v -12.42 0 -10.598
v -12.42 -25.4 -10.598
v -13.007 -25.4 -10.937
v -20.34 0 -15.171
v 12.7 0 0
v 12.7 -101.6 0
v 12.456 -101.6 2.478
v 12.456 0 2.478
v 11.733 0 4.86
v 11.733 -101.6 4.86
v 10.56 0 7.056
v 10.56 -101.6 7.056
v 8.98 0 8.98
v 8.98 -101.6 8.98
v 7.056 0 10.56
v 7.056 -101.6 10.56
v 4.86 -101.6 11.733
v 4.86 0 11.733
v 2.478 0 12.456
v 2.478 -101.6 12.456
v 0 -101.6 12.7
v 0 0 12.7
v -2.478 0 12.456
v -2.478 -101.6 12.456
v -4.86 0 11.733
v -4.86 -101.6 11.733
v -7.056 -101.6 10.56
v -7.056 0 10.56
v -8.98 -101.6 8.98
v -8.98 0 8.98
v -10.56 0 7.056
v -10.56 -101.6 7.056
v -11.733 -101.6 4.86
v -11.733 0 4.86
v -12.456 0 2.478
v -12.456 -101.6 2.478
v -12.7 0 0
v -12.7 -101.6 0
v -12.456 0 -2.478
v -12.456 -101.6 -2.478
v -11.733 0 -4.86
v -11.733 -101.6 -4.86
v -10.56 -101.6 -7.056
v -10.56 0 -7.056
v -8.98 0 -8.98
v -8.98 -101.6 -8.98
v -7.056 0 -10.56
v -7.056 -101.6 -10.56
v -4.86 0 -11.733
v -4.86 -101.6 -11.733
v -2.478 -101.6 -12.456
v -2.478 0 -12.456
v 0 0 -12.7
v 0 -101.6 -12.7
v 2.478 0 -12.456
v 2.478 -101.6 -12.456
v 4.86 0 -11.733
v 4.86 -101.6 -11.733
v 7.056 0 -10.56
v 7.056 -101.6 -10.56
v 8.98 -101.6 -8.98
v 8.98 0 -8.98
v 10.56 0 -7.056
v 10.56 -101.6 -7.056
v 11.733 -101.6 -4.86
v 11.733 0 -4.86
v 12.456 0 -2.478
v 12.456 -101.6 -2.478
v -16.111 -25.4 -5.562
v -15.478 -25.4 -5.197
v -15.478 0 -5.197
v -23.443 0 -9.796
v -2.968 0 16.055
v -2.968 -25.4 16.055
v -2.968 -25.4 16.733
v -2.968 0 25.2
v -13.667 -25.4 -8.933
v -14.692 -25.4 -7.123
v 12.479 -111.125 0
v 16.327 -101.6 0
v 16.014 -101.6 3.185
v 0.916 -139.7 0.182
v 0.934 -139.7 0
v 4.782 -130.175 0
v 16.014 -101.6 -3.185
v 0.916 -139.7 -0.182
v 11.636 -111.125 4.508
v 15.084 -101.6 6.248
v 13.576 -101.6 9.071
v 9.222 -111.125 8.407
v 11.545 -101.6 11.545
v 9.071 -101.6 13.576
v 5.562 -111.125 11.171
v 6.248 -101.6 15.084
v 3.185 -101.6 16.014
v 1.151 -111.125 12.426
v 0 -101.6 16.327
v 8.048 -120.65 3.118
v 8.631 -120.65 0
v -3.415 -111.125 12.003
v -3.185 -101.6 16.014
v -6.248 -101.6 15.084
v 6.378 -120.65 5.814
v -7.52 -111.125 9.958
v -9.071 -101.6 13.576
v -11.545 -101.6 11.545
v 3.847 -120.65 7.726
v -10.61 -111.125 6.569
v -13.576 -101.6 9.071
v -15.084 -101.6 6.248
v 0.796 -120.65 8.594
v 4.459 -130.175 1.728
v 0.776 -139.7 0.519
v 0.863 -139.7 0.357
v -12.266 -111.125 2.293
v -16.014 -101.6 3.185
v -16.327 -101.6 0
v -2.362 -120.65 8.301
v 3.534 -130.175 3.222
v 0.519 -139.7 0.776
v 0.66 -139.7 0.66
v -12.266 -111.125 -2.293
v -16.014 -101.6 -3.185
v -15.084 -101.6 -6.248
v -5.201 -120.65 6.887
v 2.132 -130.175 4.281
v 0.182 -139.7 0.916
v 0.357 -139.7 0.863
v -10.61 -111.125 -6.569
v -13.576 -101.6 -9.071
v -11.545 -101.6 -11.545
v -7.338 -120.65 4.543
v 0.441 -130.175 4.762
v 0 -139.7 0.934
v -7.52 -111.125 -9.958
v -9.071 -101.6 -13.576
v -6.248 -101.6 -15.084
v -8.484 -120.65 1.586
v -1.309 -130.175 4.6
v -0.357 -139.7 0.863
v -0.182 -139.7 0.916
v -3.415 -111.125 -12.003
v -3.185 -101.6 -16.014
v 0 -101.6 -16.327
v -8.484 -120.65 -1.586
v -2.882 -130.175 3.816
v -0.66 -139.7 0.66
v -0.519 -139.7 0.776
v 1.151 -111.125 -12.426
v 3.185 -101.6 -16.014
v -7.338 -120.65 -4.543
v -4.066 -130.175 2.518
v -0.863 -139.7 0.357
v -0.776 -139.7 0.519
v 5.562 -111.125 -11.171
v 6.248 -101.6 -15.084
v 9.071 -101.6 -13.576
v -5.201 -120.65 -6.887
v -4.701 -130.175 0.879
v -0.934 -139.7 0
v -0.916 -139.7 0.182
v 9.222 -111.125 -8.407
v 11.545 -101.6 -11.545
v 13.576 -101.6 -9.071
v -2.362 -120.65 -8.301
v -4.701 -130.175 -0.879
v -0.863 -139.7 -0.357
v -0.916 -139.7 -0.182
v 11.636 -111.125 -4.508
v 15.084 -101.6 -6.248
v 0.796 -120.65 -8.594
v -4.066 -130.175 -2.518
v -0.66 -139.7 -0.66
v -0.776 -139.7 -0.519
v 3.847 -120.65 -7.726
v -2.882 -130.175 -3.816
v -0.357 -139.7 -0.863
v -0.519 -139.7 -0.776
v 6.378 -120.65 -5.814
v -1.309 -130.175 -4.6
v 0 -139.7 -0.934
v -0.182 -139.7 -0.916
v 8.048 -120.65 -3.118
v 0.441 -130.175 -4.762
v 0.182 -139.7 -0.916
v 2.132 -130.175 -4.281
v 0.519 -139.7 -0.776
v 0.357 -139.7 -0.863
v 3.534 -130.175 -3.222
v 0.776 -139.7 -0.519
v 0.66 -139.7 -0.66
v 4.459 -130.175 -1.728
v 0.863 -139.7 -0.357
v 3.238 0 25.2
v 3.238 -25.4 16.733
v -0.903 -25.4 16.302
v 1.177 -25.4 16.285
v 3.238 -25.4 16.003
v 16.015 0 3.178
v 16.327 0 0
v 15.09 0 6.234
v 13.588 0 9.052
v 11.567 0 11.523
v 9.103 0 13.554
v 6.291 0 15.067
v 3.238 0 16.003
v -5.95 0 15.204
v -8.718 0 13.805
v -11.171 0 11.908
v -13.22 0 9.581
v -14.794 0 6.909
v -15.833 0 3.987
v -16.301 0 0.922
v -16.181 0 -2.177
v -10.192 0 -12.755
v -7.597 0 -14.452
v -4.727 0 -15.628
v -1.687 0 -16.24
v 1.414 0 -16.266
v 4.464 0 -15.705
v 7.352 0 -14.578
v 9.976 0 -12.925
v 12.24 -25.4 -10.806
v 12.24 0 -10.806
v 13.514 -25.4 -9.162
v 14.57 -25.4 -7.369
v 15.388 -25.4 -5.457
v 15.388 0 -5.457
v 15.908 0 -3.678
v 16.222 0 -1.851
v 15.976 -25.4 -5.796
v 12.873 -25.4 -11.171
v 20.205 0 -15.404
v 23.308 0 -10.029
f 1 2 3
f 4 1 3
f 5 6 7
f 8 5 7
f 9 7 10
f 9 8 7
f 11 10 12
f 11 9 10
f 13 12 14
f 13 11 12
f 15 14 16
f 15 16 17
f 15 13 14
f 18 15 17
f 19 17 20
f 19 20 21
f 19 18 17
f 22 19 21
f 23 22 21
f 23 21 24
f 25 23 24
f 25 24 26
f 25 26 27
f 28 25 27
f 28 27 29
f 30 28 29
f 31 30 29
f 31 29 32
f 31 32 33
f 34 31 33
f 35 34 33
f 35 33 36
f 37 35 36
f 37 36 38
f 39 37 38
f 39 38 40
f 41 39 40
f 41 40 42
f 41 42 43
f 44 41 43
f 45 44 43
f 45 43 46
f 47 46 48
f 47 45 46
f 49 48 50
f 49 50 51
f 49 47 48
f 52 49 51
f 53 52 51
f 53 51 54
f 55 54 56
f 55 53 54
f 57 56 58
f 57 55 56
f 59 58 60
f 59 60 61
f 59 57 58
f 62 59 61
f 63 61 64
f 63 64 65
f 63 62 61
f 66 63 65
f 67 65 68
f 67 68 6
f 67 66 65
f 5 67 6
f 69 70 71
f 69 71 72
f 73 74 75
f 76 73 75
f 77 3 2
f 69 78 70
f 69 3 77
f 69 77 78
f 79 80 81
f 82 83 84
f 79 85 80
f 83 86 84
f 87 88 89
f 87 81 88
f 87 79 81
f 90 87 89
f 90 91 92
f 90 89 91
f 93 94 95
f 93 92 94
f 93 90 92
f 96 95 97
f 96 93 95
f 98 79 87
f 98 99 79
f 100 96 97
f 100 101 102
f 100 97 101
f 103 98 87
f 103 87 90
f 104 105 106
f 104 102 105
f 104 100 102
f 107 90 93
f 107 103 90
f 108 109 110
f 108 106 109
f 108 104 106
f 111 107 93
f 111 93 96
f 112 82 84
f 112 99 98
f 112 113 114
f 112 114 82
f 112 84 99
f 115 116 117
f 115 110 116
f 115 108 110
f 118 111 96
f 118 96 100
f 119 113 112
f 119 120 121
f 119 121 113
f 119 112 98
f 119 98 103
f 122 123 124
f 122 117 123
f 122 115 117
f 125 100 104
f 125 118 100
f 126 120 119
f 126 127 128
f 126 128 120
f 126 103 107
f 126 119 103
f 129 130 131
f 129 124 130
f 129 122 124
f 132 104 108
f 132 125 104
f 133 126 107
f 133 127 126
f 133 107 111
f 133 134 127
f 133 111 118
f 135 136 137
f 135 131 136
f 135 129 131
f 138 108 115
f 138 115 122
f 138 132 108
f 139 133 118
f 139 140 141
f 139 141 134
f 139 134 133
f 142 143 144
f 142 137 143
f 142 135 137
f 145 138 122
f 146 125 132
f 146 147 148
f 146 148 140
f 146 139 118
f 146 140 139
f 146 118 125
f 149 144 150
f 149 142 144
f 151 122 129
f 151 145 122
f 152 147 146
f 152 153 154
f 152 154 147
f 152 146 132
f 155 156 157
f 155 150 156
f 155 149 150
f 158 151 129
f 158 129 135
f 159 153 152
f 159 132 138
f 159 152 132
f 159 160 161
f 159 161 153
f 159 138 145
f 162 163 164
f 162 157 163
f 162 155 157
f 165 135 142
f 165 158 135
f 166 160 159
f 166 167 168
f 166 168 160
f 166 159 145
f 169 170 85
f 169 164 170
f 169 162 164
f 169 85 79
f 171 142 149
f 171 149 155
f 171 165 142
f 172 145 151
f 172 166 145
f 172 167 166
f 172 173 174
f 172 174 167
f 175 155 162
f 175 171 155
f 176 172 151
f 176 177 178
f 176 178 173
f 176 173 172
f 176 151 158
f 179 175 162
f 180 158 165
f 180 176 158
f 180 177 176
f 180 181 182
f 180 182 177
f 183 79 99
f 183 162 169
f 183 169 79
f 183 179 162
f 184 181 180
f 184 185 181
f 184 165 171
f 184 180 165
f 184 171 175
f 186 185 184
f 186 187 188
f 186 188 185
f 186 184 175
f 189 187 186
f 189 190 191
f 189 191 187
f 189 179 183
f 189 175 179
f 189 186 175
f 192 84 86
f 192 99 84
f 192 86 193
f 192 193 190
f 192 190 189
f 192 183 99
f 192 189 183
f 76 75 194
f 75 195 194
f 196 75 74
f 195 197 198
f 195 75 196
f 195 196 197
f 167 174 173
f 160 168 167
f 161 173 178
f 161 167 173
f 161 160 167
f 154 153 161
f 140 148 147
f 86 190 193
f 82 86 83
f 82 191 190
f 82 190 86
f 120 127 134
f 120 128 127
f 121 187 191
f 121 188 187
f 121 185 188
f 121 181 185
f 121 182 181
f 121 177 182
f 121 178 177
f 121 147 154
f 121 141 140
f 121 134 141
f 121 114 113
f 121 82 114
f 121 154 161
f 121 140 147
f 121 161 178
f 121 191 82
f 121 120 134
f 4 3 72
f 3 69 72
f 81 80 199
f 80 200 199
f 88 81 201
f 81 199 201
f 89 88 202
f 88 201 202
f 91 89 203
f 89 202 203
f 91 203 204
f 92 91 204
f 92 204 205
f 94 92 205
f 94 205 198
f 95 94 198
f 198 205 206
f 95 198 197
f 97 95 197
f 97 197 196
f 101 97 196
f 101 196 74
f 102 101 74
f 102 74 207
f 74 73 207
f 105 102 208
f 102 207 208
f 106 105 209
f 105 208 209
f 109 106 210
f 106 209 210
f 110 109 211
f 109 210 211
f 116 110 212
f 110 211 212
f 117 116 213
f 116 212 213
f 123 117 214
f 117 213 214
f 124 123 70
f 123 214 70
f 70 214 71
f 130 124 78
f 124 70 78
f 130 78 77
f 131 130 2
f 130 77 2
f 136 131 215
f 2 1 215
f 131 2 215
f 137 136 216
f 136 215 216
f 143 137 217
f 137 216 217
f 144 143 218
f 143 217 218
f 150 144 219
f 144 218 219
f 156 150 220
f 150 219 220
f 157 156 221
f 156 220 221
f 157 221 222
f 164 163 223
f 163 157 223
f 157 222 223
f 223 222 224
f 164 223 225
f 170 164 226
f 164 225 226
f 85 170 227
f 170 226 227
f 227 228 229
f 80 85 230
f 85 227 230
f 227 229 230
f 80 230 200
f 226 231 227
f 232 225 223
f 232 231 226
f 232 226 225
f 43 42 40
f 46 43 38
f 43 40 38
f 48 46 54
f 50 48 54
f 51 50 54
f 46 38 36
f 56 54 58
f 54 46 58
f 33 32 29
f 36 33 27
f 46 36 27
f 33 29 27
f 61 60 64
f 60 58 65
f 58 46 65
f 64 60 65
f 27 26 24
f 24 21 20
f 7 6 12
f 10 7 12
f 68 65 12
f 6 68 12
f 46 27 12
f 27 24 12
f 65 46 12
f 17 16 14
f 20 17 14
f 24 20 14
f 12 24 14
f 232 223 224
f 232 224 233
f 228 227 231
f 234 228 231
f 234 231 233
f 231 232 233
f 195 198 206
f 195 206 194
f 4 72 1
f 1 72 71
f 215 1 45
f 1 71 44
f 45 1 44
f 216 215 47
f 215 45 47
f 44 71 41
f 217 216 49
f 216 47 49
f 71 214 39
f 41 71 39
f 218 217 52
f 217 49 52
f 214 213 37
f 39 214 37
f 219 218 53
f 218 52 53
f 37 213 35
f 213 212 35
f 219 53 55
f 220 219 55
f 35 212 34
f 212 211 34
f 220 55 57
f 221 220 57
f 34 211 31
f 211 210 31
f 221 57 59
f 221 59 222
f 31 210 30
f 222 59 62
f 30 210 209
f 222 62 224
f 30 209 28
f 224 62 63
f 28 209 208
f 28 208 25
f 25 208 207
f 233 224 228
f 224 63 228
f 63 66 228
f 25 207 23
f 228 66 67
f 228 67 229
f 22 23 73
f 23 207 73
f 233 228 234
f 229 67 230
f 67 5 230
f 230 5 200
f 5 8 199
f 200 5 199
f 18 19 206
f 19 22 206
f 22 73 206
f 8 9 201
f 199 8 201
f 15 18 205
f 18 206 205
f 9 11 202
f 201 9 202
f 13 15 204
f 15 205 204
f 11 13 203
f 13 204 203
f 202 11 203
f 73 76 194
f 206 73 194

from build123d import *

# Parameters (mm, degrees)
F0_R     = 16.327253737
F0_R_2   = 12.7
F1_DEPTH = 101.6
F2_R     = 16.327253737
F3_DEPTH = 38.1
F3_TAPER = 22
F4_W     = 6.20650989
F4_H     = 11.6034736857
F5_DEPTH = 25.4
F7_DEPTH = 12.7
F8_COUNT = 3
F8_ANGLE = 240


with BuildPart() as f1:
    # F0 (on Front) → F1 (new body)
    with BuildSketch(Plane.XZ):
        Circle(F0_R)
        Circle(F0_R_2, mode=Mode.SUBTRACT)
    extrude(amount=F1_DEPTH)

    # F2 (on face) → F3 (join)
    with BuildSketch(Plane.XZ.offset(101.6)):
        Circle(F2_R)
    extrude(amount=F3_DEPTH, taper=F3_TAPER)

    # F4 (on Front) → F5 (join)
    with BuildSketch(Plane.XZ):
        with Locations((0.1349233789, 19.4290732034)):
            Rectangle(F4_W, F4_H)
    extrude(amount=F5_DEPTH)

    # F6 (on Right) → F7 (cut, symmetric)
    with BuildSketch(Plane.YZ):
        Polygon((25.9975232184, 33.8659547269), (-25.5434866995, 34.4056524336), (-25.8133374155, 16.5956672281), align=None)
    extrude(amount=F7_DEPTH, both=True, mode=Mode.SUBTRACT)

    # F8: F1 ×3 about axis
    f8_axis = Axis((0, 0, 0), (0, -1, 0))


with BuildPart() as f1_1:
    add(f1.part)
    for i in range(1, F8_COUNT):
        add(f1.part.rotate(f8_axis, i * F8_ANGLE / (F8_COUNT - 1)))


solid = f1_1.part
